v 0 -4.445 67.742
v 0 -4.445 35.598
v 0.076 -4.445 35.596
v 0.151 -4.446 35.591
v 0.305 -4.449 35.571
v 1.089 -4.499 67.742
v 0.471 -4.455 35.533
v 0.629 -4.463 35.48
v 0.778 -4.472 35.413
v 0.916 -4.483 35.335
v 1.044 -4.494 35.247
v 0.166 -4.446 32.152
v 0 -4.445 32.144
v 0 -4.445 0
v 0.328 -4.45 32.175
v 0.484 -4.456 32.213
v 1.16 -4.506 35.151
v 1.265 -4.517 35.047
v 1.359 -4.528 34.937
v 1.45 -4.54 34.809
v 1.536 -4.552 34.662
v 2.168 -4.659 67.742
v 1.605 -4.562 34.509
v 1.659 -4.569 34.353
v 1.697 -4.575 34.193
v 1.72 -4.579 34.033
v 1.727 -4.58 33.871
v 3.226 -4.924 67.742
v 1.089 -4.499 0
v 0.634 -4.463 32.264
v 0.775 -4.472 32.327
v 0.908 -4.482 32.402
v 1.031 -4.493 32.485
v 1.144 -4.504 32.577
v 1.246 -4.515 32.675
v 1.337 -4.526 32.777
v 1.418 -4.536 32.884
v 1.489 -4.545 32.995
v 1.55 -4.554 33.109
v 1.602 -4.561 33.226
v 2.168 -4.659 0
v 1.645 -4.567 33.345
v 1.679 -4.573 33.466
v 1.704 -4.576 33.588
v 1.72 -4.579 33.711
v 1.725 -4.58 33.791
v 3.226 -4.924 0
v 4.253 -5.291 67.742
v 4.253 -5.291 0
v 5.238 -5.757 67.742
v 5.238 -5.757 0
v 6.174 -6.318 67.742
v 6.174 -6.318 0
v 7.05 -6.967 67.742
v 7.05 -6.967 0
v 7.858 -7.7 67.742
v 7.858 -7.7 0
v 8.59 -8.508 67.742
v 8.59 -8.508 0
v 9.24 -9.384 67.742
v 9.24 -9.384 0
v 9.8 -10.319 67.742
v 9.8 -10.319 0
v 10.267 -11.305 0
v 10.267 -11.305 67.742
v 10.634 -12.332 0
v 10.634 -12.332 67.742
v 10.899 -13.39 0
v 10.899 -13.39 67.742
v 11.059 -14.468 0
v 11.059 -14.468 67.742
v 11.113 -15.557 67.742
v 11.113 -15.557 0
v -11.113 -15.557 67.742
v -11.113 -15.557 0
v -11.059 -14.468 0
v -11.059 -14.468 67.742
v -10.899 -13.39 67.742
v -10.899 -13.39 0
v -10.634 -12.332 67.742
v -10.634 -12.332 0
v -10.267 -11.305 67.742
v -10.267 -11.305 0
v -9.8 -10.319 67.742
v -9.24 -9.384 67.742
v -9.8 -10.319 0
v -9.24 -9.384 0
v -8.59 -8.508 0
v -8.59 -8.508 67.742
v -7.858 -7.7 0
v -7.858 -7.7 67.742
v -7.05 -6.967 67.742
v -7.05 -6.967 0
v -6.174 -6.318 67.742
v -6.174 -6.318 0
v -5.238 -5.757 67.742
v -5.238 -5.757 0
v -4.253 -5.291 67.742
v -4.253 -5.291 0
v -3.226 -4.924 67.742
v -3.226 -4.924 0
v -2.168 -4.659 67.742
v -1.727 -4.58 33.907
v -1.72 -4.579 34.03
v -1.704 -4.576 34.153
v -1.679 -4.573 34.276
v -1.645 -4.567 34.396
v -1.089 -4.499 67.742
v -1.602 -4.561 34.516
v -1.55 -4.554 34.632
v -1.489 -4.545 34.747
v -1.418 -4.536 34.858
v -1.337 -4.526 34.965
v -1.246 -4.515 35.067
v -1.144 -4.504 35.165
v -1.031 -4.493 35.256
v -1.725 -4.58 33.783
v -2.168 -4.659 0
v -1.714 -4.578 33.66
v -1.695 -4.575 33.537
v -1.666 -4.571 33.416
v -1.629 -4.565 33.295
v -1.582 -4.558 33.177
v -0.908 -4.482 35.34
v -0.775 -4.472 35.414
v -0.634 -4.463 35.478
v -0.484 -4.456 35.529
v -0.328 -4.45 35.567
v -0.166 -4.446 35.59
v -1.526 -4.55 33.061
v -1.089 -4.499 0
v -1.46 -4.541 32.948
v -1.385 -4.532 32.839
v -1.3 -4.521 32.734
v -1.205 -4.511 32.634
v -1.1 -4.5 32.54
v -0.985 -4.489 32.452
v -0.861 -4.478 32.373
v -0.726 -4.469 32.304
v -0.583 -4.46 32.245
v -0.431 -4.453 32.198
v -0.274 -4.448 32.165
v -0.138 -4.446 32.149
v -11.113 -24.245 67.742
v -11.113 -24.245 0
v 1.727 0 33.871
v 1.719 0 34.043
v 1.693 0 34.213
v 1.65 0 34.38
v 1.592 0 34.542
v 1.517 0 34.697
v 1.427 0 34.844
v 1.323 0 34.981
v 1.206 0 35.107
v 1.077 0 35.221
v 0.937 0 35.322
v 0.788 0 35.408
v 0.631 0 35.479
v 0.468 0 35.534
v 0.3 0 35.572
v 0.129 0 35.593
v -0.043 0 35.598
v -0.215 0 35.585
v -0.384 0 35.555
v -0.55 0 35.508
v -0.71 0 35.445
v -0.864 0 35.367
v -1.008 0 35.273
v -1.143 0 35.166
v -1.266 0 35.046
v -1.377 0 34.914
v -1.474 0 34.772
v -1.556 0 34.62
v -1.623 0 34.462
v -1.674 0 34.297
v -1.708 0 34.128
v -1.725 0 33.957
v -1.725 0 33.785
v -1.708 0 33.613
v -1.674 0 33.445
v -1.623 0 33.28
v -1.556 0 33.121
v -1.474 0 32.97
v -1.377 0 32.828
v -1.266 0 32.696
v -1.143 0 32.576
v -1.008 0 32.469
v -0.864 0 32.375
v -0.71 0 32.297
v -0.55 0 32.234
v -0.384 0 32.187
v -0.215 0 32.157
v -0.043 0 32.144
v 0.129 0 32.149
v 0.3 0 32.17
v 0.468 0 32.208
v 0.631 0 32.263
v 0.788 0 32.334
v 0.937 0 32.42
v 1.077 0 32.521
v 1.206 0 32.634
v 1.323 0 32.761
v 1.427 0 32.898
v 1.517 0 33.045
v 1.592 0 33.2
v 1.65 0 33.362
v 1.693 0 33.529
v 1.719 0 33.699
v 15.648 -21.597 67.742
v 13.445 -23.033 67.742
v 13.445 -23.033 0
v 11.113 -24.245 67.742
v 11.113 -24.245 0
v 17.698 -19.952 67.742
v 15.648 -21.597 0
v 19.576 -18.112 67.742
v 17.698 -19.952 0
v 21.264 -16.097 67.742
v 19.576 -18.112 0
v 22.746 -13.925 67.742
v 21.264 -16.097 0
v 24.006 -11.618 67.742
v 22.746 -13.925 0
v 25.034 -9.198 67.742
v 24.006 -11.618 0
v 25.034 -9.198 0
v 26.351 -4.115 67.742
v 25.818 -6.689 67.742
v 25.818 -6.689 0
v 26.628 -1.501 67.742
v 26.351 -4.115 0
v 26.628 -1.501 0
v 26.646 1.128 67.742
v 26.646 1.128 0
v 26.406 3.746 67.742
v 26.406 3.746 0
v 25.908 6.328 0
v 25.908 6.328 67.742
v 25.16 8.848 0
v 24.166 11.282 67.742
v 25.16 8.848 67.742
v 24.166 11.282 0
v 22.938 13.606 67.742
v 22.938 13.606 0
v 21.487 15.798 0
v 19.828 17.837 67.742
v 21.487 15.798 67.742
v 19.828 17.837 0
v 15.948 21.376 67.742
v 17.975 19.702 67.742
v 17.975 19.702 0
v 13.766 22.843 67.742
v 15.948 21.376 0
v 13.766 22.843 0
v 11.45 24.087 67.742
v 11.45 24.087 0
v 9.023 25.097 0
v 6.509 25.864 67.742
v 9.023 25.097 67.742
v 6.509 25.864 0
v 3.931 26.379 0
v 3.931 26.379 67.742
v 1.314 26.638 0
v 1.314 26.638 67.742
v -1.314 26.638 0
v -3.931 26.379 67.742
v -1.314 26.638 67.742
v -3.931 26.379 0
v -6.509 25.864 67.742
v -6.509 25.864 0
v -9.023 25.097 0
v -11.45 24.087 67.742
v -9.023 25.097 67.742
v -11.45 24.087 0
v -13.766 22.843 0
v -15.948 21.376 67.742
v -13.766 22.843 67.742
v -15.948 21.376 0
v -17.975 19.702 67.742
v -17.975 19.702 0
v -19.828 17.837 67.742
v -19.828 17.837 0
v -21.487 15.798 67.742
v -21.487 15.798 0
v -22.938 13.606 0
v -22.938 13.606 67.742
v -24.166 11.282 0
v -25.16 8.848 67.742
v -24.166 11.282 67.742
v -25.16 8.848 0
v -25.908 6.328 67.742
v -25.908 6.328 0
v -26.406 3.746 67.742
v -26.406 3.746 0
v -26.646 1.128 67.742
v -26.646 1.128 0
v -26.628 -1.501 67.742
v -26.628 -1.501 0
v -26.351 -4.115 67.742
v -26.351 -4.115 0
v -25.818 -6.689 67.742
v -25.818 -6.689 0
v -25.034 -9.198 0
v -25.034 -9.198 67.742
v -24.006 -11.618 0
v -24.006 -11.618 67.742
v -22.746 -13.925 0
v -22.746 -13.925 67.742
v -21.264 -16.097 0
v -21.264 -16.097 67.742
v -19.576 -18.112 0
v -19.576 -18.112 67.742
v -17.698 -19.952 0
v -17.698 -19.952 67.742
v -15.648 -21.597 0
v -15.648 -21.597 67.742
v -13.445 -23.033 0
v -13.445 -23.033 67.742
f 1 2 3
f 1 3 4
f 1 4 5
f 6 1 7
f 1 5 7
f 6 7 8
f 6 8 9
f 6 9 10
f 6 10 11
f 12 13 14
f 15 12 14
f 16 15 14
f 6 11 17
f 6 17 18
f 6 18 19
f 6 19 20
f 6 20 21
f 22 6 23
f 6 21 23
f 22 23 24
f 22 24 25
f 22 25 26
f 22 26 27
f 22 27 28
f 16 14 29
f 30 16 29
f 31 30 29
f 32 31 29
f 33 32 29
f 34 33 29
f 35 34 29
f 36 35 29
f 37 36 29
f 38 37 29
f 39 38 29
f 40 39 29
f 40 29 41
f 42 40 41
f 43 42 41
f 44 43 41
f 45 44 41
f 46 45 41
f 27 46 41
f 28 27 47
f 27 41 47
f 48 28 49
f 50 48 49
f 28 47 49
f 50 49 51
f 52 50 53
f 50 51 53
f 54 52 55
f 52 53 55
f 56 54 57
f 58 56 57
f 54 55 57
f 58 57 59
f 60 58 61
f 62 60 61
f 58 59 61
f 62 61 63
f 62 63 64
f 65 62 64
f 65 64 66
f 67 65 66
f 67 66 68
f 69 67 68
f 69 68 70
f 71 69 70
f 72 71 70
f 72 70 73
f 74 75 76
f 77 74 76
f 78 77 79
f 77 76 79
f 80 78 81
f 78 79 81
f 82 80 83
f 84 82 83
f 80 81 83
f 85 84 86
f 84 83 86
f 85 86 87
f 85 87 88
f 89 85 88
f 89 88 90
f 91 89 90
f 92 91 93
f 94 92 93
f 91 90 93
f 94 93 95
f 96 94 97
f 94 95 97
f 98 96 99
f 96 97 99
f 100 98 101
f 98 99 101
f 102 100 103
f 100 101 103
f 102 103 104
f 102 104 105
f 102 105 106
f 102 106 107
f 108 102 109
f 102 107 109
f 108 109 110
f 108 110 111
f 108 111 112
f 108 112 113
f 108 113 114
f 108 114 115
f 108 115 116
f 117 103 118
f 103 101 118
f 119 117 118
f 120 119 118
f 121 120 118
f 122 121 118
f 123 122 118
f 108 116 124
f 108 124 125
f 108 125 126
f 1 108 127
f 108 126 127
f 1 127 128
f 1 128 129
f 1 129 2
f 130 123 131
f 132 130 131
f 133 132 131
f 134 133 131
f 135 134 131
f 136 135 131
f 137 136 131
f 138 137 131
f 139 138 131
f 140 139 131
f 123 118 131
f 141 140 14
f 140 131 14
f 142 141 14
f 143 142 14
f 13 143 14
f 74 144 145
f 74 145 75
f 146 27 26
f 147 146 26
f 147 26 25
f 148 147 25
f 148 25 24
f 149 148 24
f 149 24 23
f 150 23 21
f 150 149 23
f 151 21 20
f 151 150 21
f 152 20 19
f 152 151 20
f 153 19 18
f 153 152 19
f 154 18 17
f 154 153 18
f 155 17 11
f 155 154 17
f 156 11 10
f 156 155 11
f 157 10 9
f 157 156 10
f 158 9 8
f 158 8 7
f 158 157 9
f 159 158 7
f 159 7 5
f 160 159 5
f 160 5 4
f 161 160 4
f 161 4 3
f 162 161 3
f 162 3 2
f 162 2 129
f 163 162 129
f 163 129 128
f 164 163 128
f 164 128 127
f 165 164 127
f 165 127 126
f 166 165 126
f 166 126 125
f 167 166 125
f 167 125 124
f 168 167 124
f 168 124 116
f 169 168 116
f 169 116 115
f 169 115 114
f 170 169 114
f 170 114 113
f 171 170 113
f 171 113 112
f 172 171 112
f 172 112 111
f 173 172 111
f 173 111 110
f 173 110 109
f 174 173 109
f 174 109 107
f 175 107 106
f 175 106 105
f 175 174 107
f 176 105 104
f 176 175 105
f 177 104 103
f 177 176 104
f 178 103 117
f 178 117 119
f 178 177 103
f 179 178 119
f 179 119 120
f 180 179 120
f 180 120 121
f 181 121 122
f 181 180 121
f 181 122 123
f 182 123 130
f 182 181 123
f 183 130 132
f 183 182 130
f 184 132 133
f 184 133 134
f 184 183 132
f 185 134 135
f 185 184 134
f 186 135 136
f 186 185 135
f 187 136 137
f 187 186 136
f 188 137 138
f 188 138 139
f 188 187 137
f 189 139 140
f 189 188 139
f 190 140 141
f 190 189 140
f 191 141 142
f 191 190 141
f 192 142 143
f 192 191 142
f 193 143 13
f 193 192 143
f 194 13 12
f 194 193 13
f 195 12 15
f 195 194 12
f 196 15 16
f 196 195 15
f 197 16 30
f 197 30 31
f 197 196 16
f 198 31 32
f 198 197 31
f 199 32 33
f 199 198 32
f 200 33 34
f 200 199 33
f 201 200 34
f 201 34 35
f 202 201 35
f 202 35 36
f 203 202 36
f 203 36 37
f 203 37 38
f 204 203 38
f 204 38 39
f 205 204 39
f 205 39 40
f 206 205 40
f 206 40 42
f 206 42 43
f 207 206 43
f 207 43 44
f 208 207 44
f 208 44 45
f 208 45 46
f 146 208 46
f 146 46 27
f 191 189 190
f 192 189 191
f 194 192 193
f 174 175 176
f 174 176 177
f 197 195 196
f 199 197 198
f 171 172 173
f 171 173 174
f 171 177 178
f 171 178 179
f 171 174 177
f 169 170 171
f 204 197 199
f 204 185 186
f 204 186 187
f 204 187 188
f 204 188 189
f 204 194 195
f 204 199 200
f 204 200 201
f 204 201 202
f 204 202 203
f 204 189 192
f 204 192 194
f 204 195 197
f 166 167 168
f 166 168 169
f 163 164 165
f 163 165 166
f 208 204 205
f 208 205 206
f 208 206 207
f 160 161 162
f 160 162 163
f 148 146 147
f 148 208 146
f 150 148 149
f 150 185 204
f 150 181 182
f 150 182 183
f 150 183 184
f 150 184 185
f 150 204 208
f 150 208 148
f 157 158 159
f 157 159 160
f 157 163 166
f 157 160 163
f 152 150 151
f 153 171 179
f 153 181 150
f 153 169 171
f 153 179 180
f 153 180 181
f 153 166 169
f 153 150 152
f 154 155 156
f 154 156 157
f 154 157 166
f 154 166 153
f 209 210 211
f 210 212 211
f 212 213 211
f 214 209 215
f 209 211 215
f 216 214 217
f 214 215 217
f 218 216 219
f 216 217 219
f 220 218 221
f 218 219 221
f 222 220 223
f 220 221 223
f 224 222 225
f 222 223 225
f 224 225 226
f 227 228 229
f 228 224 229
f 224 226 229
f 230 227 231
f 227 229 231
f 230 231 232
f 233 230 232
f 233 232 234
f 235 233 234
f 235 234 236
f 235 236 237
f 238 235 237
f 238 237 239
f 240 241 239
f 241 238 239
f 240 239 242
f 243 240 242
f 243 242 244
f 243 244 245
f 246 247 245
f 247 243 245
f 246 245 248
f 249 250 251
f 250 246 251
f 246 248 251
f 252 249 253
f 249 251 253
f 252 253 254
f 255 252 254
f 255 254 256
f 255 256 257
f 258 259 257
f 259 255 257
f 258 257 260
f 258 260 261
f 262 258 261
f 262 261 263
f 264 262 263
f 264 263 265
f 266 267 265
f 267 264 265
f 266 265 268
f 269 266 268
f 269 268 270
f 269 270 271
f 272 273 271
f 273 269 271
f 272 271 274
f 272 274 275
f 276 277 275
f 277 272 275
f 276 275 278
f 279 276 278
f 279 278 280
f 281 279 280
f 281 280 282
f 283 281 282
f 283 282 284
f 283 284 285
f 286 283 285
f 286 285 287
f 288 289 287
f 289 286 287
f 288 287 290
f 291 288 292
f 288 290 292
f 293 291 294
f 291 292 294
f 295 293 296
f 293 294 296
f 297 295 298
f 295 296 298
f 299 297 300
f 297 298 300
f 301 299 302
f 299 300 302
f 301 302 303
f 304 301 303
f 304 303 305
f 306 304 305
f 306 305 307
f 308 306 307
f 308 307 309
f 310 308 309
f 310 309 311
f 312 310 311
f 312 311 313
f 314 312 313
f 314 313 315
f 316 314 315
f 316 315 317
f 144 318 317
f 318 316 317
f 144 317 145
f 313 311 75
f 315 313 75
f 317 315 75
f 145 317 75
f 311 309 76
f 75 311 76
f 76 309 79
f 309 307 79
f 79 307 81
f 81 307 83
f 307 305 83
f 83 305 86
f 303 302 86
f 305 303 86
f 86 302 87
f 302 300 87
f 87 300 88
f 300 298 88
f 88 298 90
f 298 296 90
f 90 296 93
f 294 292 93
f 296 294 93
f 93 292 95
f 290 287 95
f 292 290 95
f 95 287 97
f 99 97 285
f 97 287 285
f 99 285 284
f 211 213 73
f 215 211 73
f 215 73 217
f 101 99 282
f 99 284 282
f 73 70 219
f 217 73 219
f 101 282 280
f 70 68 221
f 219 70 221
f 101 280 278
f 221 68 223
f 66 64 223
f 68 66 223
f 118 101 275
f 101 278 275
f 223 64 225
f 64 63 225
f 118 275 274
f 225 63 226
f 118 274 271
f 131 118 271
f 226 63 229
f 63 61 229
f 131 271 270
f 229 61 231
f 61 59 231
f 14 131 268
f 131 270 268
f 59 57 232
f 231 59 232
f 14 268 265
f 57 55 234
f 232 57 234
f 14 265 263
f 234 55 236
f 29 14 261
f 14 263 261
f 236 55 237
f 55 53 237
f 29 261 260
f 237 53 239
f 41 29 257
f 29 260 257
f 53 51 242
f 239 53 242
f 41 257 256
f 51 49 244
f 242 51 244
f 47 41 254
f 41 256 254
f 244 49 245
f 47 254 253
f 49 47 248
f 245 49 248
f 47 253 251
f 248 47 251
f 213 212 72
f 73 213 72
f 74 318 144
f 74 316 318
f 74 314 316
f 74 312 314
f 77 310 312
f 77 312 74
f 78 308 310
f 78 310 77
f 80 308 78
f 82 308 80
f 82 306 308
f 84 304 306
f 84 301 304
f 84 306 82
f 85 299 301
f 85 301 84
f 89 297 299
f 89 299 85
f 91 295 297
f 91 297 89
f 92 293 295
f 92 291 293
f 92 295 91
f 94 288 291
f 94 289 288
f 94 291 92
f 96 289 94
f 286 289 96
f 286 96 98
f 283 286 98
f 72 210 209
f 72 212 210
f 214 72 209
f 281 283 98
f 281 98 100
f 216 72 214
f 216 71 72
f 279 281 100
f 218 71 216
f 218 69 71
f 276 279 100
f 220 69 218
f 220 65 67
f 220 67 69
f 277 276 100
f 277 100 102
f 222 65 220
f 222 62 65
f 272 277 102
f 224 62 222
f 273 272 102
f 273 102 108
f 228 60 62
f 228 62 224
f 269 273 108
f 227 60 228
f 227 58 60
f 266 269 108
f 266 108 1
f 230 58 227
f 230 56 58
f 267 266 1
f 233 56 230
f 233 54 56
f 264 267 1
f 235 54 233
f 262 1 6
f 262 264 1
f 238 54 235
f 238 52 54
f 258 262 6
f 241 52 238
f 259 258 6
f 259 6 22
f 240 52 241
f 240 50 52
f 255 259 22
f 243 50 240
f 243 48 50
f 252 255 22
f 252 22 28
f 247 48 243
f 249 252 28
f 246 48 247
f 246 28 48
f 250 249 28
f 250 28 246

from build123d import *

# Parameters (mm, degrees)
F0_R     = 26.67
F1_DEPTH = 67.7418
F2_W     = 22.225
F2_H     = 22.225
F3_DEPTH = 67.7418
F4_R     = 11.11249
F5_R     = 1.7272
F6_DEPTH = 5.5800505253


# Not quite as in the source:
# - a fillet or chamfer is up to 0.001 mm smaller than in the source, because OpenCascade refuses the exact size


with BuildPart() as f1:
    # F0 (on Top) → F1 (new body)
    with BuildSketch(Plane.XY):
        Circle(F0_R)
    extrude(amount=F1_DEPTH)

    # F2 (on face) → F3 (cut, through all)
    with BuildSketch(Plane.XY.offset(67.7418)):
        with Locations((0, -15.5575)):
            Rectangle(F2_W, F2_H)
    extrude(amount=-F3_DEPTH, mode=Mode.SUBTRACT)

    # F4 (radius 11.1125 in the source; OpenCascade refuses exactly that, so slightly less here)
    f4_edges = [f1.edges().sort_by_distance(p)[0] for p in [
        (11.1125, -4.445, 33.8709),
        (-11.1125, -4.445, 33.8709),
    ]]
    fillet(f4_edges, radius=F4_R)

    # F5 (on Front) → F6 (cut, up to face)
    with BuildSketch(Plane.XZ):
        with Locations((0, 33.8709)):
            Circle(F5_R)
    extrude(amount=F6_DEPTH, mode=Mode.SUBTRACT)


solid = f1.part
